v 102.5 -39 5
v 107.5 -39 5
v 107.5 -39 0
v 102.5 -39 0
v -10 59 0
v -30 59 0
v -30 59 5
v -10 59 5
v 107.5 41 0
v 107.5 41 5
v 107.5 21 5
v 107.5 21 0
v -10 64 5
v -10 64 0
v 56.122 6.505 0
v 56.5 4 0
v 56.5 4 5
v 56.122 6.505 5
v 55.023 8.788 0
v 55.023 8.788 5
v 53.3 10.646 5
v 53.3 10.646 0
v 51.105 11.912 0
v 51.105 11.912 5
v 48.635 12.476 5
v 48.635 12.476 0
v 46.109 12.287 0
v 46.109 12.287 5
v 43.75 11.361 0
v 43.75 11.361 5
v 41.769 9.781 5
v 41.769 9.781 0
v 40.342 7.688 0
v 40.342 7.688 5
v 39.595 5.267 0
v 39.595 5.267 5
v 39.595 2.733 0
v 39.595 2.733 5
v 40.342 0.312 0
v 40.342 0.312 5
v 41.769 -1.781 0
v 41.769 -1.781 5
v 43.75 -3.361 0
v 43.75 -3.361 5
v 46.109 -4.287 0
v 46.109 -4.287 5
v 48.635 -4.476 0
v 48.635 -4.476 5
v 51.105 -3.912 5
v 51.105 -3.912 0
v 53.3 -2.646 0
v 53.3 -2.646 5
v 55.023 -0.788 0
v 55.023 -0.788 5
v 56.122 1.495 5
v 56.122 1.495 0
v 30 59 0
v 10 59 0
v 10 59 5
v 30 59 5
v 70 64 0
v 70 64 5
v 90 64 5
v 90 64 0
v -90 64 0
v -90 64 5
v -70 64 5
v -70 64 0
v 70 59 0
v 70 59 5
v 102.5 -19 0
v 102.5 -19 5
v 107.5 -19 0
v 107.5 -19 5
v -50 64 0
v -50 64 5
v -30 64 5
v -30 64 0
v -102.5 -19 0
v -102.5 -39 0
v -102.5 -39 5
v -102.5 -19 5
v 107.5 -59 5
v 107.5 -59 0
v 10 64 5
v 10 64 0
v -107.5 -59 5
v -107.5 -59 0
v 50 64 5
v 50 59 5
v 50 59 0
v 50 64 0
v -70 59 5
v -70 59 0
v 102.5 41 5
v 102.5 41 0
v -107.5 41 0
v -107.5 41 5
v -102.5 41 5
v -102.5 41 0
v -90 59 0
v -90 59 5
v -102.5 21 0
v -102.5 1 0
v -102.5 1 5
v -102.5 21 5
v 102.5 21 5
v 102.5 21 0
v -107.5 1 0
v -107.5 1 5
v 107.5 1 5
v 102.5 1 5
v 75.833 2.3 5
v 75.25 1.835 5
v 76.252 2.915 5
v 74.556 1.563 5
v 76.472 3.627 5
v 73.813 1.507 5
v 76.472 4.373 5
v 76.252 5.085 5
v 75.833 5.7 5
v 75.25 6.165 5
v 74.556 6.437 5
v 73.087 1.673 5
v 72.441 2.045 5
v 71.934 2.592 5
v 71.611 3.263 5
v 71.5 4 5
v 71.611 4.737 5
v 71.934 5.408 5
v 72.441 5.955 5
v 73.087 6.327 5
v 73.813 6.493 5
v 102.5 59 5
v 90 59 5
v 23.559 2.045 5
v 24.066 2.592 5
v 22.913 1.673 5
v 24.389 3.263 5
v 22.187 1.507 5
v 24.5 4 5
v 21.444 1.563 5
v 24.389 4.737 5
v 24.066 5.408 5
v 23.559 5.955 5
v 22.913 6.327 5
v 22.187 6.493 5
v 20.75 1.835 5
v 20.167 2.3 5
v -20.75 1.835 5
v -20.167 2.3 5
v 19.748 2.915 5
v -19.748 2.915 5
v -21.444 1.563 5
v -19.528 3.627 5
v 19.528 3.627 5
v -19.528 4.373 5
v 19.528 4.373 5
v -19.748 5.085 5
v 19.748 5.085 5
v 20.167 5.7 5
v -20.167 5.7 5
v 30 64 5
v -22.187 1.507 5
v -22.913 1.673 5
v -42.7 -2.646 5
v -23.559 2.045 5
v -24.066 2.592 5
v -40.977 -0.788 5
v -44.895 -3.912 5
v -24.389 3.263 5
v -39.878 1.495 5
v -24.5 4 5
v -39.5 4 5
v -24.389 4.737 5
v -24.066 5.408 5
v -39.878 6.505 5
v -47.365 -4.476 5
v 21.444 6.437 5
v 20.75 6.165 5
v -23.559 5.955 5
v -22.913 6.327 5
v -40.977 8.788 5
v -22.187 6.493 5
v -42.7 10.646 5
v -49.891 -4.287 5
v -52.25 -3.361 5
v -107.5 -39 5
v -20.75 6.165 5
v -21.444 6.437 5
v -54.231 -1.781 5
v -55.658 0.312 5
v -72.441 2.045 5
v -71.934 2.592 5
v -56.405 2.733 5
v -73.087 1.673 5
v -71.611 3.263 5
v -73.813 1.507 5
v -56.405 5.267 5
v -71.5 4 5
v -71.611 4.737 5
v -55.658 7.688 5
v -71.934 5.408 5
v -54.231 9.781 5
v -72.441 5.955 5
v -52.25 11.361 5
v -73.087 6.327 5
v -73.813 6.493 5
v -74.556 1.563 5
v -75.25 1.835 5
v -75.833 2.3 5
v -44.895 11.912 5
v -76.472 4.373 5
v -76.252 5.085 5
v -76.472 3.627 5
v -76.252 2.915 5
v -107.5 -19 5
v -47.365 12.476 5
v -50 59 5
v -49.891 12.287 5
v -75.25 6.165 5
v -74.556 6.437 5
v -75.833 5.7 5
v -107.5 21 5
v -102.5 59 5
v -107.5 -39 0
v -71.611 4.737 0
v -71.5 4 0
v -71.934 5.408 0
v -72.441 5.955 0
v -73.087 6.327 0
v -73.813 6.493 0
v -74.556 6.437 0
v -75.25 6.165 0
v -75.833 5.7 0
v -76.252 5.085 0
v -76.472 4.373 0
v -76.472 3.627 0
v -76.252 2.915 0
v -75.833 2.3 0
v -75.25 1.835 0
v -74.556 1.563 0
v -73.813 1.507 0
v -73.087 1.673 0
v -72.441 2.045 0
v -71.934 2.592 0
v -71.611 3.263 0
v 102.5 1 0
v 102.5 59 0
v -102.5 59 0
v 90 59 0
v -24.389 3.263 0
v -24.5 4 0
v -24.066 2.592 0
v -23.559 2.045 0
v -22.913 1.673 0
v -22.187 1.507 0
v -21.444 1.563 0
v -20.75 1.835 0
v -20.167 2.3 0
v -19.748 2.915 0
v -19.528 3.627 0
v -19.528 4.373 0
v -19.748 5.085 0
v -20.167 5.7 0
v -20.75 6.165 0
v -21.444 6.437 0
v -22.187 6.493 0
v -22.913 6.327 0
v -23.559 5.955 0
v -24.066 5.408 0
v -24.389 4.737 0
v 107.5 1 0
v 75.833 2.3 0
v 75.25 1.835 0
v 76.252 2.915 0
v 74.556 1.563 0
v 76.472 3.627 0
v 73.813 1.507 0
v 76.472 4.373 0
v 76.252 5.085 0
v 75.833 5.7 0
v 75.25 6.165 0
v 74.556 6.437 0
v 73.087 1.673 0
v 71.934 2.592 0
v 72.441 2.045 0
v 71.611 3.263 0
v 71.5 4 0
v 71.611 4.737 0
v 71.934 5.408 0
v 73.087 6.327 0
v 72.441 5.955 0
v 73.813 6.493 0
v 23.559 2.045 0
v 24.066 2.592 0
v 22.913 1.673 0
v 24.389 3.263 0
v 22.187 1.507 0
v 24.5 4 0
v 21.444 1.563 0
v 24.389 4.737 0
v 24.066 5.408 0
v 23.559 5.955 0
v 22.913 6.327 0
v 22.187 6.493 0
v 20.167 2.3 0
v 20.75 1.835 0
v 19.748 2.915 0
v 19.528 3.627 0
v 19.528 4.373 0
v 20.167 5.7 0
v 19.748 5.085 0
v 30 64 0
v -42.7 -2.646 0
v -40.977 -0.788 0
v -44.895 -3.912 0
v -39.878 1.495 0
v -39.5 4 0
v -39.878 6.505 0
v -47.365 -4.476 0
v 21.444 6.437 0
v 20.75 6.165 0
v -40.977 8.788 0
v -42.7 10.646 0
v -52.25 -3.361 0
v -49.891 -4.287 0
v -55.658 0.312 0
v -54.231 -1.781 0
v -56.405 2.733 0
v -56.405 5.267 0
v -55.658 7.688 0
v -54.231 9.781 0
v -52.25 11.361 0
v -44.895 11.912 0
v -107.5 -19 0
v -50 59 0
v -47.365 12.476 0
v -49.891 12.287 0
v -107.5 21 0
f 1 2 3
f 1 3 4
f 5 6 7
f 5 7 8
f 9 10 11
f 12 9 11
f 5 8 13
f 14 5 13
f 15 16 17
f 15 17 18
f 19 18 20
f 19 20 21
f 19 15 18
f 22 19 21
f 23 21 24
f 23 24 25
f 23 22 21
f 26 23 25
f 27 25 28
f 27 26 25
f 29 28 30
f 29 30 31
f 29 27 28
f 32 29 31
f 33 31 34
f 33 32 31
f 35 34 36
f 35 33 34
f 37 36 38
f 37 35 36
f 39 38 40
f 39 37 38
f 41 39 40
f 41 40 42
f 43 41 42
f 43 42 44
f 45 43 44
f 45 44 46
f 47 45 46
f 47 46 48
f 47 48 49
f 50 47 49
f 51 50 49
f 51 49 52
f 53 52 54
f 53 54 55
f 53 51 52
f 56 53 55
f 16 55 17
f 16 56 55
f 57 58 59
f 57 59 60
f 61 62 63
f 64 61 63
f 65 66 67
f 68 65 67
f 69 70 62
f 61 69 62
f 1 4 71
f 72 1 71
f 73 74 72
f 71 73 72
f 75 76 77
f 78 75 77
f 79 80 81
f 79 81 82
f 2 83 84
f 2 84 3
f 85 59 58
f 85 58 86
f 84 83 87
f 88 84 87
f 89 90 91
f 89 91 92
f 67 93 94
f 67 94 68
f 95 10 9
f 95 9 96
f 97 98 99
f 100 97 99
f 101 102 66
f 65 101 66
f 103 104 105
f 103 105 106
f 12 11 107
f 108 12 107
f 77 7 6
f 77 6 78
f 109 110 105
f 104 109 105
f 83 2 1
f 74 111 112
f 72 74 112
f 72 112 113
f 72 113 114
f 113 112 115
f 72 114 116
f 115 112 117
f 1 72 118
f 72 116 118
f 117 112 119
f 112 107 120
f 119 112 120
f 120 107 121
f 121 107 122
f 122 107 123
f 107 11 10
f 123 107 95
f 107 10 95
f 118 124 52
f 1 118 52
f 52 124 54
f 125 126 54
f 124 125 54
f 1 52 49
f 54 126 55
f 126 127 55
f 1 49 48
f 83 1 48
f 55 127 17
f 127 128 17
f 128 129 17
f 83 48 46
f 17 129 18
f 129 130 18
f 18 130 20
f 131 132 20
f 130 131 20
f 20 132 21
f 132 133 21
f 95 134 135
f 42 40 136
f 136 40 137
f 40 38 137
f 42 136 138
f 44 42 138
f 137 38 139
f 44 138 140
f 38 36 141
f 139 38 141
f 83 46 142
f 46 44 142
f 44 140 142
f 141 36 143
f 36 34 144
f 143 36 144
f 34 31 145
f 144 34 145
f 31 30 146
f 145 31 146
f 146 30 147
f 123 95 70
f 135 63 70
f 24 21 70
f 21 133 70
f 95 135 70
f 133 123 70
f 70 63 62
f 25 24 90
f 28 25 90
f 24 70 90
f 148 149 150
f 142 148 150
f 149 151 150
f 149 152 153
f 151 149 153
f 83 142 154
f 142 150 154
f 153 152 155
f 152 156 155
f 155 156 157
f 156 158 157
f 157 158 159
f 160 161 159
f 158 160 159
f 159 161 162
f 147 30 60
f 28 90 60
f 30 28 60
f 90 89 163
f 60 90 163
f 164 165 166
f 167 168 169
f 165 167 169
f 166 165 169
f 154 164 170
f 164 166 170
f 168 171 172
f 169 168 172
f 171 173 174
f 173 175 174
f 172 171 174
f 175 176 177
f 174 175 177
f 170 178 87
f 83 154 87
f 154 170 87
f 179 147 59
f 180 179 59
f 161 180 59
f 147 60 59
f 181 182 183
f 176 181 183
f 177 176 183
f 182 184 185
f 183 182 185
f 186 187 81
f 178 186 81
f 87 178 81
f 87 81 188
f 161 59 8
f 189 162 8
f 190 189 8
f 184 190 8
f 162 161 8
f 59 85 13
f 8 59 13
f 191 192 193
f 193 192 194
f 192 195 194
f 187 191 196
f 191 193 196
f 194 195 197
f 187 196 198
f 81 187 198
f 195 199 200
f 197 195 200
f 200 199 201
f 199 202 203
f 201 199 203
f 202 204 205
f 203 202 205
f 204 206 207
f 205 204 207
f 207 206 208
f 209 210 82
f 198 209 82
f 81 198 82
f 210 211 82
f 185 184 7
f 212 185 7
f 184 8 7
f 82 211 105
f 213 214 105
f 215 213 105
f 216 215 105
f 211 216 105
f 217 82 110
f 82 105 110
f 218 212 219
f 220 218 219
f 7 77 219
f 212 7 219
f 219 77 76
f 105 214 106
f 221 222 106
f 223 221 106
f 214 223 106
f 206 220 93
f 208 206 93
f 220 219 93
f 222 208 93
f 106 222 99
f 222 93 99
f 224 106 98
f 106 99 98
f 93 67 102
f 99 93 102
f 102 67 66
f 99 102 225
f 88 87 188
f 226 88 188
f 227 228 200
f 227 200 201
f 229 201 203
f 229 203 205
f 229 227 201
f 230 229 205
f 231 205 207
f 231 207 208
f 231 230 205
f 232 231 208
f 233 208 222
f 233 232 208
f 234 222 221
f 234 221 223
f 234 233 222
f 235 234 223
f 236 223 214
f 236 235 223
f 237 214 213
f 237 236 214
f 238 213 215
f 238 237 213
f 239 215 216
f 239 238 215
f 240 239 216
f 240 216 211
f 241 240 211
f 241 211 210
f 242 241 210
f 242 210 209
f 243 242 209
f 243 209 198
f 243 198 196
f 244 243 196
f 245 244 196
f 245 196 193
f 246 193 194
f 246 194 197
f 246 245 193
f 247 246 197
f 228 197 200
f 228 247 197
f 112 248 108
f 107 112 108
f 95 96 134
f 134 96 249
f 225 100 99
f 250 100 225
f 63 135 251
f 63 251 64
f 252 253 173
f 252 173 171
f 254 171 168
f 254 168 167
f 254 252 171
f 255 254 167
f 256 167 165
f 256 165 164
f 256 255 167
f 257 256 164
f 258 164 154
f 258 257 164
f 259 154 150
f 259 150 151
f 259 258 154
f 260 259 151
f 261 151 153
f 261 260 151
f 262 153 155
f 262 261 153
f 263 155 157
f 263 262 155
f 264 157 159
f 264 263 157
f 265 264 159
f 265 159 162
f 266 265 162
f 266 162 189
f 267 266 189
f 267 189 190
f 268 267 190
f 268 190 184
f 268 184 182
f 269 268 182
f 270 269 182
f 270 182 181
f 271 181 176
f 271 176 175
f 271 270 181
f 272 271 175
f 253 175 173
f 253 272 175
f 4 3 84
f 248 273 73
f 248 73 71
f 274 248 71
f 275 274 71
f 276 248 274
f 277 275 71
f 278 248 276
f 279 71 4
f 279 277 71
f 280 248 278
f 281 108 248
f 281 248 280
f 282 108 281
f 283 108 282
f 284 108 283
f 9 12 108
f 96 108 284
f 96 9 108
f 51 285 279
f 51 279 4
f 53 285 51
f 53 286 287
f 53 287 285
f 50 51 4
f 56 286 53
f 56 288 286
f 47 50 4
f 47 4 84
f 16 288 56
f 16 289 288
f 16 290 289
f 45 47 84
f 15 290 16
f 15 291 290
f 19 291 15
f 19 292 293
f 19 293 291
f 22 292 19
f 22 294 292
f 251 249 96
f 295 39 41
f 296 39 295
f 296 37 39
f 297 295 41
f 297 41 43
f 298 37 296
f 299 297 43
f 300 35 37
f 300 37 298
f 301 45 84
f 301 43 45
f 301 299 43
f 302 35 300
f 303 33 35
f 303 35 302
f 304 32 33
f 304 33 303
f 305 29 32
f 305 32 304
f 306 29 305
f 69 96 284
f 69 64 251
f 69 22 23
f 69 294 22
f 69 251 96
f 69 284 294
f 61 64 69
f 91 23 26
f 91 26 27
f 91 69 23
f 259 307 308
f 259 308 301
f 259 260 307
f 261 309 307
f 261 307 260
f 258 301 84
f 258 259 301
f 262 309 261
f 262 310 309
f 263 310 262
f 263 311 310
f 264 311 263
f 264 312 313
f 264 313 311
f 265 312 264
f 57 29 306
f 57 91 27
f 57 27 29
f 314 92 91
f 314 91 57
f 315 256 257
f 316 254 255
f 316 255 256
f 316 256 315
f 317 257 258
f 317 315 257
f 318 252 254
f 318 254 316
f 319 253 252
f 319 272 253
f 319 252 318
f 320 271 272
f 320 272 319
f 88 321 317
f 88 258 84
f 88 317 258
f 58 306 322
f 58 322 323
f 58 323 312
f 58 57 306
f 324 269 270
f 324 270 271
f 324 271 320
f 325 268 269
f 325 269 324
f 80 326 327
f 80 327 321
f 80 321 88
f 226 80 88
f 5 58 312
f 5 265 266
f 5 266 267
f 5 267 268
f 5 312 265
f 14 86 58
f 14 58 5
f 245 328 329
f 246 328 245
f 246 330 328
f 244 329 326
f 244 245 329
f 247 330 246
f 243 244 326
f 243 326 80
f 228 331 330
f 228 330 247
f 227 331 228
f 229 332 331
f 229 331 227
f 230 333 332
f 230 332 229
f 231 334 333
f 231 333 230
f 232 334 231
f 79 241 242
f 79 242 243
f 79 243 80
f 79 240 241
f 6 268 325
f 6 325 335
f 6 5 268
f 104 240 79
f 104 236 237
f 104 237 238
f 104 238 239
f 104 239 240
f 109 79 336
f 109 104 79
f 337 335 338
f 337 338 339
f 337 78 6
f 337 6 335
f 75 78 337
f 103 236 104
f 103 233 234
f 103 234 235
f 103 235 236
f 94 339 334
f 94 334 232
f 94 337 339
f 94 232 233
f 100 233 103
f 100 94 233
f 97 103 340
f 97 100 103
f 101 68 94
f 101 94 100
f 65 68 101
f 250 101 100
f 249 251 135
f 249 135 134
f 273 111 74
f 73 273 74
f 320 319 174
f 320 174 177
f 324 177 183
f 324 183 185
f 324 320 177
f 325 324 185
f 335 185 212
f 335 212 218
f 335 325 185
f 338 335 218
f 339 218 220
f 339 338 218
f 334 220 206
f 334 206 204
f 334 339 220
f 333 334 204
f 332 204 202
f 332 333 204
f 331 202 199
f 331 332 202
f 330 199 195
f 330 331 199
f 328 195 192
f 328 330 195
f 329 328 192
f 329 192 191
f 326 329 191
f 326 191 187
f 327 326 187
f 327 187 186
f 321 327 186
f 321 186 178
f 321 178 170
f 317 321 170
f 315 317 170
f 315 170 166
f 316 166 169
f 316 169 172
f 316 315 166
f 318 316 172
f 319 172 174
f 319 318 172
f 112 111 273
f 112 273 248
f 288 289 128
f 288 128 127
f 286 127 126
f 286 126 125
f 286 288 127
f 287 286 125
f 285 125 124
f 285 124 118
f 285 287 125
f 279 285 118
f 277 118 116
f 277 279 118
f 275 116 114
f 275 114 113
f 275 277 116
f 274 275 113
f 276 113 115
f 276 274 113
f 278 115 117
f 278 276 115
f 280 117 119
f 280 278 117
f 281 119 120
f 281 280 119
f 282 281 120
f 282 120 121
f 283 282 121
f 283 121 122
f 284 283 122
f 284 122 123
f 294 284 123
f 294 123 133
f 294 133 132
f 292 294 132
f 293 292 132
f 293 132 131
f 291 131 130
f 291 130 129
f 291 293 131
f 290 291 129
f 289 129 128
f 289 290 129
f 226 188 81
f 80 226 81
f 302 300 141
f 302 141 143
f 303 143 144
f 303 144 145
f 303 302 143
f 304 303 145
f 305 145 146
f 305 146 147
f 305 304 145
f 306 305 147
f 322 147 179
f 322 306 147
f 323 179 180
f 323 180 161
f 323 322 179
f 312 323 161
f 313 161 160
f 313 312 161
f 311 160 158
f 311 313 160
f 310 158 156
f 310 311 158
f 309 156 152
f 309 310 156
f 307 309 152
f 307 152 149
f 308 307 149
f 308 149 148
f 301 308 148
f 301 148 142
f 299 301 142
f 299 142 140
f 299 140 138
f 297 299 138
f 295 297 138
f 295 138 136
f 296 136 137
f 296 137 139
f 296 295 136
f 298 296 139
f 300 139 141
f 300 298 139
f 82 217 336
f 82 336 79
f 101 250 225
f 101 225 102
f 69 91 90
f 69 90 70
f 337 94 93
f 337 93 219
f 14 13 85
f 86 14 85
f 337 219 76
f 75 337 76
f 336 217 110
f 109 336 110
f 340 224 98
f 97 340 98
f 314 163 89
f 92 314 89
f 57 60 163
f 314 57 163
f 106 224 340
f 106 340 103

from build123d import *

# Parameters (mm, degrees)
SKETCH_1_W               = 205
SKETCH_1_H               = 118
SKETCH_1_R               = 8.5
SKETCH_1_R_2             = 2.5
EXTRUDE_1_DEPTH          = 5
SKETCH_2_W               = 5
SKETCH_2_H               = 20
EXTRUDE_2_DEPTH          = 5
PATTERN_LINEAR_1_COUNT   = 3
PATTERN_LINEAR_1_PITCH   = 40
MIRROR_1_COPY_1_SKETCH_W = 5
MIRROR_1_COPY_1_SKETCH_H = 20
MIRROR_1_COPY_1_DEPTH    = 5
MIRROR_1_COPY_2_SKETCH_W = 5
MIRROR_1_COPY_2_SKETCH_H = 20
MIRROR_1_COPY_2_DEPTH    = 5
SKETCH_3_W               = 20
SKETCH_3_H               = 5
EXTRUDE_3_DEPTH          = 5
PATTERN_LINEAR_2_COUNT   = 3
PATTERN_LINEAR_2_PITCH   = 40
PATTERN_LINEAR_3_COUNT   = 3
PATTERN_LINEAR_3_PITCH   = 40


with BuildPart() as part:
    # 스케치1 → 보스-돌출1 (new body)
    with BuildSketch(Plane.XY):
        Rectangle(SKETCH_1_W, SKETCH_1_H)
        with Locations((48, 4)):
            Circle(SKETCH_1_R, mode=Mode.SUBTRACT)
        with Locations((-48, 4)):
            Circle(SKETCH_1_R, mode=Mode.SUBTRACT)
        with Locations((-74, 4)):
            Circle(SKETCH_1_R_2, mode=Mode.SUBTRACT)
        with Locations(Location((-22, 4, 0), (0, 0, 180))):
            Circle(SKETCH_1_R_2, mode=Mode.SUBTRACT)
        with Locations((22, 4)):
            Circle(SKETCH_1_R_2, mode=Mode.SUBTRACT)
        with Locations(Location((74, 4, 0), (0, 0, 180))):
            Circle(SKETCH_1_R_2, mode=Mode.SUBTRACT)
    extrude(amount=EXTRUDE_1_DEPTH)

    # 스케치2 → 보스-돌출2 (add)
    with BuildSketch(Plane.XY.offset(5)):
        with Locations((-105, -49)):
            Rectangle(SKETCH_2_W, SKETCH_2_H)
    extrude_2 = extrude(amount=-EXTRUDE_2_DEPTH)

    # 선형 패턴1: 보스-돌출2 ×3
    with Locations(*[(0, i * PATTERN_LINEAR_1_PITCH, 0) for i in range(1, PATTERN_LINEAR_1_COUNT)]):
        add(extrude_2)

    # 대칭 복사1: 보스-돌출2 across plane
    add(extrude_2.mirror(Plane(origin=(0, 0, 0), x_dir=(0, 0, 1), z_dir=(1, 0, 0))))

    # 대칭 복사1 copy 1 sketch → 대칭 복사1 copy 1 (add)
    with BuildSketch(Plane(origin=(0, 40, 5), x_dir=(-1, 0, 0), z_dir=(0, 0, 1))):
        with Locations((-105, 49)):
            Rectangle(MIRROR_1_COPY_1_SKETCH_W, MIRROR_1_COPY_1_SKETCH_H)
    extrude(amount=-MIRROR_1_COPY_1_DEPTH)

    # 대칭 복사1 copy 2 sketch → 대칭 복사1 copy 2 (add)
    with BuildSketch(Plane(origin=(0, 80, 5), x_dir=(-1, 0, 0), z_dir=(0, 0, 1))):
        with Locations((-105, 49)):
            Rectangle(MIRROR_1_COPY_2_SKETCH_W, MIRROR_1_COPY_2_SKETCH_H)
    extrude(amount=-MIRROR_1_COPY_2_DEPTH)

    # 스케치3 → 보스-돌출3 (add)
    with BuildSketch(Plane.XY.offset(5)):
        with Locations((0, 61.5)):
            Rectangle(SKETCH_3_W, SKETCH_3_H)
    extrude_3 = extrude(amount=-EXTRUDE_3_DEPTH)

    # 선형 패턴2: 보스-돌출3 ×3
    with Locations(*[(i * PATTERN_LINEAR_2_PITCH, 0, 0) for i in range(1, PATTERN_LINEAR_2_COUNT)]):
        add(extrude_3)

    # 선형 패턴3: 보스-돌출3 ×3
    with Locations(*[(-i * PATTERN_LINEAR_3_PITCH, 0, 0) for i in range(1, PATTERN_LINEAR_3_COUNT)]):
        add(extrude_3)


solid = part.part
